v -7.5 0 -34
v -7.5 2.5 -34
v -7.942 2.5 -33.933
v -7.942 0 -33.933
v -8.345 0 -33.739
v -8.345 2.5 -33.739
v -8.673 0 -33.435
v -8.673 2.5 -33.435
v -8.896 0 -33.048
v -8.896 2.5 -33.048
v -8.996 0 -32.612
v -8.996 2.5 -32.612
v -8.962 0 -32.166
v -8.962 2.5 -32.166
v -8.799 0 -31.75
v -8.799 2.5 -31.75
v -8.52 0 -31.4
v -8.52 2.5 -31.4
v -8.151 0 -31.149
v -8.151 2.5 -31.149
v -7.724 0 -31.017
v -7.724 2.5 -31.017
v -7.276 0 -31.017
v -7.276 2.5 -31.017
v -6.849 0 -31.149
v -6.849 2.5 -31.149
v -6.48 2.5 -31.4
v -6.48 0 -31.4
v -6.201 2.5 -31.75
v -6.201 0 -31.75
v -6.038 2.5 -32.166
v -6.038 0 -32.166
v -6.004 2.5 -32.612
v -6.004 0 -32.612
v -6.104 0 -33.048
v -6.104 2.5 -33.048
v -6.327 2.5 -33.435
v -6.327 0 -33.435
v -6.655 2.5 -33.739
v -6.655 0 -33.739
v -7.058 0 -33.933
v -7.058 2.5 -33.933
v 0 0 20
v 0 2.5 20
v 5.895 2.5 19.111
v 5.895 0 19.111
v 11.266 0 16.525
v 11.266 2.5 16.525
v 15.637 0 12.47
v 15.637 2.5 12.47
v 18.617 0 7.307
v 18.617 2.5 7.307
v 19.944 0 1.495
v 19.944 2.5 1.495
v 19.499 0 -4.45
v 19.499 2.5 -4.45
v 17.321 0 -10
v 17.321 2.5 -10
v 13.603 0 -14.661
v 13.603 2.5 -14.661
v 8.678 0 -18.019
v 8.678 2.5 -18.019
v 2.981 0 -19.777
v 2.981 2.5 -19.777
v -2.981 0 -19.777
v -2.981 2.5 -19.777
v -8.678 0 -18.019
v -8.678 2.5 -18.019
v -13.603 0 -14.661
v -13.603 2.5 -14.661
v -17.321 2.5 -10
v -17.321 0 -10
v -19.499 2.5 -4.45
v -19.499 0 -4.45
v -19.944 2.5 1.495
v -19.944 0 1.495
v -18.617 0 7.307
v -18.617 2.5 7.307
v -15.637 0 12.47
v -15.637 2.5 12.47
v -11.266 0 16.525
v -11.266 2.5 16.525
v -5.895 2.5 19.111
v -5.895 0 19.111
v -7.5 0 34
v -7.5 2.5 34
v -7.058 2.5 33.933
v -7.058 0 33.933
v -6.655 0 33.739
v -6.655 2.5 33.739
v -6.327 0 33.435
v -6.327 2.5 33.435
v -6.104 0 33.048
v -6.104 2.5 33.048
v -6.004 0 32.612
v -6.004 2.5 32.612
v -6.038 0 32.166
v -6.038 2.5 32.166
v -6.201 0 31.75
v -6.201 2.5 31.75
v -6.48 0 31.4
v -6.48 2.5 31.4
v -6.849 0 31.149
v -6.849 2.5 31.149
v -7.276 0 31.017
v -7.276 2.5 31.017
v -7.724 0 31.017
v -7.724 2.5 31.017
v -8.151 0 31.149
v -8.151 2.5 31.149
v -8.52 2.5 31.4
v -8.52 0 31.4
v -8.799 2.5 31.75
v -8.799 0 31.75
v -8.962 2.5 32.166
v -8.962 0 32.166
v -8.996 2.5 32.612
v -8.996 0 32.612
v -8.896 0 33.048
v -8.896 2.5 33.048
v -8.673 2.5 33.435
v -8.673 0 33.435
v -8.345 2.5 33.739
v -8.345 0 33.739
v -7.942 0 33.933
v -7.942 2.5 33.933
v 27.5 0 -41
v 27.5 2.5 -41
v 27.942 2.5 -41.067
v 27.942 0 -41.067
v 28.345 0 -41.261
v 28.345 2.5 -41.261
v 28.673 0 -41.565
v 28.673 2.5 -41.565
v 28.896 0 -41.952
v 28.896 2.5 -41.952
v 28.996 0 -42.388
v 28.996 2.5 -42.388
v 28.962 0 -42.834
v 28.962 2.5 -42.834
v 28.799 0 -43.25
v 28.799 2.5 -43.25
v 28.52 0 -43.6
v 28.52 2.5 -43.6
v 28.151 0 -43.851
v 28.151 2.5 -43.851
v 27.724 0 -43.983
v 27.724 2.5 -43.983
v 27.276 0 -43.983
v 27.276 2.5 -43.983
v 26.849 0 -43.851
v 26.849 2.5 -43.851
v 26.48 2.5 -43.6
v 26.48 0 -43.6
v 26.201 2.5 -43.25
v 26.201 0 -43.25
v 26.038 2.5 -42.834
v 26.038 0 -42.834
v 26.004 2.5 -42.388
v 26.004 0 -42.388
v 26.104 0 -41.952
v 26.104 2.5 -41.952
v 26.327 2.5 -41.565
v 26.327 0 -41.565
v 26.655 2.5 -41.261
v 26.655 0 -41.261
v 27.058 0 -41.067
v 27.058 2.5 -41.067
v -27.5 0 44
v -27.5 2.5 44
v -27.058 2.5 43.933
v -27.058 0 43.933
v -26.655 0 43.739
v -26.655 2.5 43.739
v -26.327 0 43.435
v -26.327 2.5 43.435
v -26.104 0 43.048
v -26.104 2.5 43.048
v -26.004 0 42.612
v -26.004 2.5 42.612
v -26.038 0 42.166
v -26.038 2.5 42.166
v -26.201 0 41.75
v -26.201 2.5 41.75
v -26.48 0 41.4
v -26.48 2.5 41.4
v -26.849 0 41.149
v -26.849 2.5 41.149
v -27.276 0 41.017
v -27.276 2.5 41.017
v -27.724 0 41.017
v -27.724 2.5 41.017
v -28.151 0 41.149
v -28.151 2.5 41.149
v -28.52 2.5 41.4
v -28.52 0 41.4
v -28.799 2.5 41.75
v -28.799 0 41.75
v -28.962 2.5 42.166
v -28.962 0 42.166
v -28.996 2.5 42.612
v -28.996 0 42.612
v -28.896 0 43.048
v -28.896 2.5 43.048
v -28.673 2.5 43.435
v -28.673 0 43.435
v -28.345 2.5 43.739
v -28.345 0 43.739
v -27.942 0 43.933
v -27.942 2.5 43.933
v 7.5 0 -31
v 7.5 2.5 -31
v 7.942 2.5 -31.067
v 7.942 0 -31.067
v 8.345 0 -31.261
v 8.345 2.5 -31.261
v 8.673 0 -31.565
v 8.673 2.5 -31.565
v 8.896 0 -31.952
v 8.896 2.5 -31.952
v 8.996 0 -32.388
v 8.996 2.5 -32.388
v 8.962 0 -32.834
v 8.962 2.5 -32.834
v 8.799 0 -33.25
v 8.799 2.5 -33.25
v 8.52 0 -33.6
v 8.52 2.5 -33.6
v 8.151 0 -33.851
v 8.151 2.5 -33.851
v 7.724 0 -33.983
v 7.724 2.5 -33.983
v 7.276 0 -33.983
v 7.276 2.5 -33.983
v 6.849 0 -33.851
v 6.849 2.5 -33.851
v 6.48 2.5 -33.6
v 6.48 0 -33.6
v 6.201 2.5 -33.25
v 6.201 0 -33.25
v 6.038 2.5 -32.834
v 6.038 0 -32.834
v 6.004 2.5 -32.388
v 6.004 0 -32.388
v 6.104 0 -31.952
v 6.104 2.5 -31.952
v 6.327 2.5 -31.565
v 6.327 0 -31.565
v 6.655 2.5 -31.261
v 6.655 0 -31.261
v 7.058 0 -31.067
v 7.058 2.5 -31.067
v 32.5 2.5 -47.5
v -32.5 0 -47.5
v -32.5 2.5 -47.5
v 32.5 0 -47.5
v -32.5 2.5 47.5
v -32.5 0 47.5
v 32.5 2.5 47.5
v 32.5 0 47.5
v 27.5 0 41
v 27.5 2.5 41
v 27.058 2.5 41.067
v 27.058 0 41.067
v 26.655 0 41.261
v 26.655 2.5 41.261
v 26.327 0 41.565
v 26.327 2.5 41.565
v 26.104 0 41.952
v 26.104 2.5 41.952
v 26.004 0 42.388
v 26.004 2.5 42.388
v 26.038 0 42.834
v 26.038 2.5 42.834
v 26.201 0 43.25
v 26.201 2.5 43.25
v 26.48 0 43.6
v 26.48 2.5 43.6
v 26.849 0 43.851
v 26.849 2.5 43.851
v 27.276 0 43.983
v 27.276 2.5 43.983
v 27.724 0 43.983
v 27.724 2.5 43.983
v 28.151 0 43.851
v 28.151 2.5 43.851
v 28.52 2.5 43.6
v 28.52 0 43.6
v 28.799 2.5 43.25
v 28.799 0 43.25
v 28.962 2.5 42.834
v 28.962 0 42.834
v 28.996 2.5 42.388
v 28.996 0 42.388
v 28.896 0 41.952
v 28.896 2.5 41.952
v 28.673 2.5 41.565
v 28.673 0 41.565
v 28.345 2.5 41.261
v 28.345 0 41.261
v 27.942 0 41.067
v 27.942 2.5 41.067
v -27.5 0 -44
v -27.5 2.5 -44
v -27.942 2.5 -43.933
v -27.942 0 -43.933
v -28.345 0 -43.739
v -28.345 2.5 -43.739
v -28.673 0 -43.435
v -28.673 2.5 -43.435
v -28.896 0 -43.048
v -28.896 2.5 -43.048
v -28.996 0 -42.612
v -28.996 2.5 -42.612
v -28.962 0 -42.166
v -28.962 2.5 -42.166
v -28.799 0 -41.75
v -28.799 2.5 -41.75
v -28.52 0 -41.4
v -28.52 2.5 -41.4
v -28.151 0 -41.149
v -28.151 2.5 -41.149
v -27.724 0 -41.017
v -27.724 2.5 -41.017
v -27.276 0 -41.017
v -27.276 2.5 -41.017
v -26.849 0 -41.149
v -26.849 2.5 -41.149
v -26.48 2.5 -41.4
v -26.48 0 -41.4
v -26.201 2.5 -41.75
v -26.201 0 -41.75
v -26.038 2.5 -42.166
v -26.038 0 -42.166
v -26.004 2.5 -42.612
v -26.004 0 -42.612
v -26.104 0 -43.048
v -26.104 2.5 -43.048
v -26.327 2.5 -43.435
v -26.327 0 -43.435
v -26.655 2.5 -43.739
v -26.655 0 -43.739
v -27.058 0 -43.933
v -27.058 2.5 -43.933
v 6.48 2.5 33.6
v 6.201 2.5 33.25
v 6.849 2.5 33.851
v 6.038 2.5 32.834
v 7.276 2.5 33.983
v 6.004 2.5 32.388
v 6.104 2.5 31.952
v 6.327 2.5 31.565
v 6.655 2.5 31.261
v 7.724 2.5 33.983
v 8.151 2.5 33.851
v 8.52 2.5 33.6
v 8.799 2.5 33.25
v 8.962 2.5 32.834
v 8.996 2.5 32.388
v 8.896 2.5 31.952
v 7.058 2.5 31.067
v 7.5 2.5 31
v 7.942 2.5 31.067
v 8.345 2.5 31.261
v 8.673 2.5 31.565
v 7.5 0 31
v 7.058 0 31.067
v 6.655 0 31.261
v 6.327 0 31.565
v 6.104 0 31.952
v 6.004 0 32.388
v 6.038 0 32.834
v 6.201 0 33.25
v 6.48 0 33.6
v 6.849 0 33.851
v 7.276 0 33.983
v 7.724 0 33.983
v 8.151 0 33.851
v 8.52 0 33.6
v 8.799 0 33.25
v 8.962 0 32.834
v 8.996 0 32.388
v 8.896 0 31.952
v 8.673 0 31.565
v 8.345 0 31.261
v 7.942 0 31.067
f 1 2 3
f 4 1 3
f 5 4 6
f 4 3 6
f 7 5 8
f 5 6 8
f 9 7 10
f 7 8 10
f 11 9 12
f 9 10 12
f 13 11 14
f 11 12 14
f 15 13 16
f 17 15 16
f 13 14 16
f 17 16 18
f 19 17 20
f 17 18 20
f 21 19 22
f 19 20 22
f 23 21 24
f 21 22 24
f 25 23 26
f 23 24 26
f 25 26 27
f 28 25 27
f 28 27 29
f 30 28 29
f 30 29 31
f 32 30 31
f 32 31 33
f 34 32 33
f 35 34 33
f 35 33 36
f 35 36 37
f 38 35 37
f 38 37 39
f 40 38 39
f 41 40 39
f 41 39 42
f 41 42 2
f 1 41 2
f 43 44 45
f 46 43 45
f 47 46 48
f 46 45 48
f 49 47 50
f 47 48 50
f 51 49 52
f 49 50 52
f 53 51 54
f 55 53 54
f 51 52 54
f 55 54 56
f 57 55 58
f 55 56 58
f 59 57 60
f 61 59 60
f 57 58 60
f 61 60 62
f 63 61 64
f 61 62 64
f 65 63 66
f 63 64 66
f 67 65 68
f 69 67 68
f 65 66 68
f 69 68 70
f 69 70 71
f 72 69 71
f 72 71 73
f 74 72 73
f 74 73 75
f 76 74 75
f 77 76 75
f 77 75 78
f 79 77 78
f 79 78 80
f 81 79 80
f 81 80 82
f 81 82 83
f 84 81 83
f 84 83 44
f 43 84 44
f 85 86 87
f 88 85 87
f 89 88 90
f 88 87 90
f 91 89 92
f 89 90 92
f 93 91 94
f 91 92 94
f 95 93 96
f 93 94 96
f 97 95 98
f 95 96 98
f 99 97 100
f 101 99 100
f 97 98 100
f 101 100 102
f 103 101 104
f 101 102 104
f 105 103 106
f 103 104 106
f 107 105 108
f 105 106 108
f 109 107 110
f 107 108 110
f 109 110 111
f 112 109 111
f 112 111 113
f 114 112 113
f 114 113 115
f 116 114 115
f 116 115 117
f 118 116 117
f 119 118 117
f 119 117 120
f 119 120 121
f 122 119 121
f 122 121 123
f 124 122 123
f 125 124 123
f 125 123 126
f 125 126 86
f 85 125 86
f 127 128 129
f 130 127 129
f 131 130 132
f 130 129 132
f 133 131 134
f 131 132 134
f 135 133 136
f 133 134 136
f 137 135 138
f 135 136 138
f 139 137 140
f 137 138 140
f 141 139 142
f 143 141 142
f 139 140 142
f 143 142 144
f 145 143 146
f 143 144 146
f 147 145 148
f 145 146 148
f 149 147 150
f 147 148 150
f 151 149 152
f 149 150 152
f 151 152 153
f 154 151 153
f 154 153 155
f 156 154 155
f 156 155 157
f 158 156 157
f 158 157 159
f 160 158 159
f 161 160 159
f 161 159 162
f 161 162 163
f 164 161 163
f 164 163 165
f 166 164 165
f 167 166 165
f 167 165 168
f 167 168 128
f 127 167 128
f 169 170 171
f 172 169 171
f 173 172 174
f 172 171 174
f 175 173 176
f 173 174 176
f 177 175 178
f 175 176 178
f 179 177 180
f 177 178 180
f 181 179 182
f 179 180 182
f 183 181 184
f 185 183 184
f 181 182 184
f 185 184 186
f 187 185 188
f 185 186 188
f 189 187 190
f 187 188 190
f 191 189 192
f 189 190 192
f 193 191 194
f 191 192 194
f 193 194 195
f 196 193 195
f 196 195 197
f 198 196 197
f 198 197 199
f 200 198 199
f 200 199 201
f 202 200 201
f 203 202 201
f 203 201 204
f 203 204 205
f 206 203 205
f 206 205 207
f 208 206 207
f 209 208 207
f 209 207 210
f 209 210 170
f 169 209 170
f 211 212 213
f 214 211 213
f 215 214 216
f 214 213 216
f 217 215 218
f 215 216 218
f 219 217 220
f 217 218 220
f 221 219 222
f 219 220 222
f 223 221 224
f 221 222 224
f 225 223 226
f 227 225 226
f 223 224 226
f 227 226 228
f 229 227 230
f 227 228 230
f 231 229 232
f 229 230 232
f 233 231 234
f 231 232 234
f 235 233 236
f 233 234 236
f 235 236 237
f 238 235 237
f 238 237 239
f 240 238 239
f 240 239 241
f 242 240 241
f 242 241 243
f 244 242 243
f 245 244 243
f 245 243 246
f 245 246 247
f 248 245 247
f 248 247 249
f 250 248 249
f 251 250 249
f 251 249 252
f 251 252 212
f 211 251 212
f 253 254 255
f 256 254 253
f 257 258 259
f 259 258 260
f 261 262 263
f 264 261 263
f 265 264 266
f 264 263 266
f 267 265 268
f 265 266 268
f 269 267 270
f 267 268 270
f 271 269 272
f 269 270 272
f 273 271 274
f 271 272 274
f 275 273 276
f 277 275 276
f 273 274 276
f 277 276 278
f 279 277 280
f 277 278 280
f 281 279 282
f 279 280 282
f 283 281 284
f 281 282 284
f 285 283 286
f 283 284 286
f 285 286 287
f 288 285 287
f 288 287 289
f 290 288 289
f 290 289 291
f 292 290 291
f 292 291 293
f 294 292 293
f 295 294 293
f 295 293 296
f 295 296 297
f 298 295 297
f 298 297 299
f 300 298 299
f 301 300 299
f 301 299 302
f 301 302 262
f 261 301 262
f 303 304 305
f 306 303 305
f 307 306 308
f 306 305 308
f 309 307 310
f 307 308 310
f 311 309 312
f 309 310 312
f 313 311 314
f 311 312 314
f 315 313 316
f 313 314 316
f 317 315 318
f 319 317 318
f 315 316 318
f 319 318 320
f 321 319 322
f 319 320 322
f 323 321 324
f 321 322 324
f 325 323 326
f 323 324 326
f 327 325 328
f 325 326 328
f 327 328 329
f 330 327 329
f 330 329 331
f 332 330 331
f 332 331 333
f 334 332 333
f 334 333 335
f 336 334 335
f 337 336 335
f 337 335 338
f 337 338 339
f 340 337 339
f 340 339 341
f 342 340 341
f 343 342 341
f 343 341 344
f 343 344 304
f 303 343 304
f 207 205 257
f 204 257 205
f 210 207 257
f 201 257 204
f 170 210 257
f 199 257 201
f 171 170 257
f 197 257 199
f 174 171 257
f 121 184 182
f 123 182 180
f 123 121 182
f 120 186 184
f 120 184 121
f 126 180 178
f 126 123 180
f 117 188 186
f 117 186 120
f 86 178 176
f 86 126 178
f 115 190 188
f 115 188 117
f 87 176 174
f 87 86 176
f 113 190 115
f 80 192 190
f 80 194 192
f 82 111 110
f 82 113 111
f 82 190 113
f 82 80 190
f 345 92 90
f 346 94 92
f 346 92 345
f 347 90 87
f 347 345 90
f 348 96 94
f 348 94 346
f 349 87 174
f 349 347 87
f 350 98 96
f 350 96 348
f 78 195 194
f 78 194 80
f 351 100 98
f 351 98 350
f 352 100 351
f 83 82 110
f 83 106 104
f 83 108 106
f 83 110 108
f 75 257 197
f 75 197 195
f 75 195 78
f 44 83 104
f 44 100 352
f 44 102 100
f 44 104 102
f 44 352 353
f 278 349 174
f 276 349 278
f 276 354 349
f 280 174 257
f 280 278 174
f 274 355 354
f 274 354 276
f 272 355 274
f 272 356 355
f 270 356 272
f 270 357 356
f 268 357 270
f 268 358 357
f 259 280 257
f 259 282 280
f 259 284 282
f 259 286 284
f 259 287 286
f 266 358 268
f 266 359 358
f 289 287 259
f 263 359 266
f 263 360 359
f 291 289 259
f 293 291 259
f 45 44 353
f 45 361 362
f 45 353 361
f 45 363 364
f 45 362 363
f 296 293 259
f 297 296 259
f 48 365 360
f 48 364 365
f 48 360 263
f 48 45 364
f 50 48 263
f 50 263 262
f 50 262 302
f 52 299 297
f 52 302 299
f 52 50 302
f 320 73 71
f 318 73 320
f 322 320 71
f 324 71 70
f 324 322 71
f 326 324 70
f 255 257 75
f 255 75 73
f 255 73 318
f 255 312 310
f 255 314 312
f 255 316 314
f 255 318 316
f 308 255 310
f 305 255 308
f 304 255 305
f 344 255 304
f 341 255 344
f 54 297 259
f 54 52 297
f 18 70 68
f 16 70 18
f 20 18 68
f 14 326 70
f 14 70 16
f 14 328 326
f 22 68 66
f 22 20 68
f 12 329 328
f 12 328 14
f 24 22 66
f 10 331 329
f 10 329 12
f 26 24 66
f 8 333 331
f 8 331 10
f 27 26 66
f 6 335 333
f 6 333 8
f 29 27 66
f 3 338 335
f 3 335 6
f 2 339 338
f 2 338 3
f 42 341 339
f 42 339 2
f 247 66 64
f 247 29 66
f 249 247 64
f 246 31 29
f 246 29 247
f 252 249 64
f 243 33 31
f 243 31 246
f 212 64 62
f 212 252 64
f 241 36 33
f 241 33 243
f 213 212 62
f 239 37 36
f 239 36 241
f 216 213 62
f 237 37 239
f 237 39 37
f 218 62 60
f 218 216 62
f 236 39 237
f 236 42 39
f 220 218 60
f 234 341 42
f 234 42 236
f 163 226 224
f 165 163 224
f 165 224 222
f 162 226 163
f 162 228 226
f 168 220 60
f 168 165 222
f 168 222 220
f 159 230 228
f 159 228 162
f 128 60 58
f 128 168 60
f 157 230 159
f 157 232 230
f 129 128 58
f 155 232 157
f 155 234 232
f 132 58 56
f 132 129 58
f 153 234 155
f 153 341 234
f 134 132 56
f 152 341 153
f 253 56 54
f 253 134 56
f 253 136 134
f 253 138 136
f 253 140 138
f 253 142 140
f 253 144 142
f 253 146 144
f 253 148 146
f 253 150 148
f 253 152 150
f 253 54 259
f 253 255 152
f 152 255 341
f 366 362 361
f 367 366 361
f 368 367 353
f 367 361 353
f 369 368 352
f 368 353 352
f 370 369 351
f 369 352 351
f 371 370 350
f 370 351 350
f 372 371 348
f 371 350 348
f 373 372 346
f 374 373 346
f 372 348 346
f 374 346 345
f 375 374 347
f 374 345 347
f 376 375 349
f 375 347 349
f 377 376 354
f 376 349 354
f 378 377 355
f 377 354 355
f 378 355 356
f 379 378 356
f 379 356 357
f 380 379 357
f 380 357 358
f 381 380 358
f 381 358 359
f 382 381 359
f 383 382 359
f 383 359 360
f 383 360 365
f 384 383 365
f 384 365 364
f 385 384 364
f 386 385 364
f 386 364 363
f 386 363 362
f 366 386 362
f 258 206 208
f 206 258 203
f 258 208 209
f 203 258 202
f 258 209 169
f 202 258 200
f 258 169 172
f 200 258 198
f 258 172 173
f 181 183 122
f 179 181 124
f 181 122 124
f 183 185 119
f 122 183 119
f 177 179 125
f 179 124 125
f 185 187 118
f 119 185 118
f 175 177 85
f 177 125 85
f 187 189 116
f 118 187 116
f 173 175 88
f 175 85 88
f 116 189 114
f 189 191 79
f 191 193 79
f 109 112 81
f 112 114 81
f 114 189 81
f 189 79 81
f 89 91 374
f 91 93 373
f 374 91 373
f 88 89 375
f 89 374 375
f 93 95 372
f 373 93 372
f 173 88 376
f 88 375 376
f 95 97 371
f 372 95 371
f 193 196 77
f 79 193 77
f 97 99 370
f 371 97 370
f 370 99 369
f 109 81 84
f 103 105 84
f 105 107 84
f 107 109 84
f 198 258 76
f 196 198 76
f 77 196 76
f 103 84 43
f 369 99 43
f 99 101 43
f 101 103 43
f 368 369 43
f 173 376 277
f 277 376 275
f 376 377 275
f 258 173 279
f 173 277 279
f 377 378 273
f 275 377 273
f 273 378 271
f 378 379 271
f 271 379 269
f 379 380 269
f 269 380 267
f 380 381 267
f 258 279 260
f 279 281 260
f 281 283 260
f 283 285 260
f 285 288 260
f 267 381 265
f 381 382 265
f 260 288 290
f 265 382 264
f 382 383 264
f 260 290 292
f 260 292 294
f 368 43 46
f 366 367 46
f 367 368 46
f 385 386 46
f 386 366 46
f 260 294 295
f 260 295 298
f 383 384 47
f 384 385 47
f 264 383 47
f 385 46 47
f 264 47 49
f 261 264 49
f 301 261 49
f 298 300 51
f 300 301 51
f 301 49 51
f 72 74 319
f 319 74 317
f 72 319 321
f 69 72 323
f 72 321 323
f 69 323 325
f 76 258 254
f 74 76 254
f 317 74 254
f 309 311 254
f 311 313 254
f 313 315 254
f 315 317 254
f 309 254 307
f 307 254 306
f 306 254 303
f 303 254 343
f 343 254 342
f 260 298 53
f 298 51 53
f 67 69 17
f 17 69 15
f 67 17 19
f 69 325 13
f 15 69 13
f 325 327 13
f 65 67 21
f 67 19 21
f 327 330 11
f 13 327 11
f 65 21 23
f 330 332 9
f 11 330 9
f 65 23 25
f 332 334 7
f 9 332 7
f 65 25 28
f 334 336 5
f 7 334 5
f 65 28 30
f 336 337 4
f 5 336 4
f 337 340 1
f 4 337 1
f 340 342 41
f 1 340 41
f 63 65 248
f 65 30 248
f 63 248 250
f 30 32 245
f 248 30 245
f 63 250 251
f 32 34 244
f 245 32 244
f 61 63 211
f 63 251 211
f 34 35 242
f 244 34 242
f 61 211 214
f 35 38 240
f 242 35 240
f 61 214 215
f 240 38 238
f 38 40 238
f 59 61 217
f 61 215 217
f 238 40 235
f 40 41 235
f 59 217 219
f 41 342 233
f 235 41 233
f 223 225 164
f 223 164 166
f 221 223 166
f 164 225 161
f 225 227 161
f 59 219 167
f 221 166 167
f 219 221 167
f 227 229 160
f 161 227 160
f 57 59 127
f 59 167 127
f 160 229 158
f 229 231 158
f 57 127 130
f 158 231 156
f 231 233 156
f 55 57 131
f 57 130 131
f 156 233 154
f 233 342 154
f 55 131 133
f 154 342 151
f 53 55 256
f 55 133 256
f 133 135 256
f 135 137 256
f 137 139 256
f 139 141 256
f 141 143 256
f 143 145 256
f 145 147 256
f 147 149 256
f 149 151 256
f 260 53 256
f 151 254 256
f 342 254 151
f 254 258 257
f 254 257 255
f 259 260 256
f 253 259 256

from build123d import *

# Parameters (mm, degrees)
CROQUIS1_W              = 65
CROQUIS1_H              = 95
SALIENTE_EXTRUIR1_DEPTH = 2.5
CROQUIS3_R              = 1.5
CORTAR_EXTRUIR2_DEPTH   = 58.608593109
CROQUIS4_R              = 20
CORTAR_EXTRUIR3_DEPTH   = 58.608593109


with BuildPart() as part:
    # Croquis1 → Saliente-Extruir1 (new body)
    with BuildSketch(Plane(origin=(0, 0, 0), x_dir=(1, 0, 0), z_dir=(0, 1, 0))):
        Rectangle(CROQUIS1_W, CROQUIS1_H)
    extrude(amount=SALIENTE_EXTRUIR1_DEPTH)

    # Croquis3 → Cortar-Extruir2 (cut, through all)
    with BuildSketch(Plane(origin=(0, 2.5, 0), x_dir=(1, 0, 0), z_dir=(0, 1, 0))):
        with Locations(Location((27.5, 42.5, 0), (0, 0, 270))):
            Circle(CROQUIS3_R)
        with Locations(Location((7.5, 32.5, 0), (0, 0, 270))):
            Circle(CROQUIS3_R)
        with Locations(Location((7.5, -32.5, 0), (0, 0, 90))):
            Circle(CROQUIS3_R)
        with Locations(Location((27.5, -42.5, 0), (0, 0, 90))):
            Circle(CROQUIS3_R)
        with Locations(Location((-27.5, 42.5, 0), (0, 0, 90))):
            Circle(CROQUIS3_R)
        with Locations(Location((-7.5, 32.5, 0), (0, 0, 90))):
            Circle(CROQUIS3_R)
        with Locations(Location((-27.5, -42.5, 0), (0, 0, 270))):
            Circle(CROQUIS3_R)
        with Locations(Location((-7.5, -32.5, 0), (0, 0, 270))):
            Circle(CROQUIS3_R)
    extrude(amount=-CORTAR_EXTRUIR2_DEPTH, mode=Mode.SUBTRACT)

    # Croquis4 → Cortar-Extruir3 (cut, through all)
    with BuildSketch(Plane(origin=(0, 2.5, 0), x_dir=(1, 0, 0), z_dir=(0, 1, 0))):
        with Locations(Location((0, 0, 0), (0, 0, 270))):
            Circle(CROQUIS4_R)
    extrude(amount=-CORTAR_EXTRUIR3_DEPTH, mode=Mode.SUBTRACT)


solid = part.part
